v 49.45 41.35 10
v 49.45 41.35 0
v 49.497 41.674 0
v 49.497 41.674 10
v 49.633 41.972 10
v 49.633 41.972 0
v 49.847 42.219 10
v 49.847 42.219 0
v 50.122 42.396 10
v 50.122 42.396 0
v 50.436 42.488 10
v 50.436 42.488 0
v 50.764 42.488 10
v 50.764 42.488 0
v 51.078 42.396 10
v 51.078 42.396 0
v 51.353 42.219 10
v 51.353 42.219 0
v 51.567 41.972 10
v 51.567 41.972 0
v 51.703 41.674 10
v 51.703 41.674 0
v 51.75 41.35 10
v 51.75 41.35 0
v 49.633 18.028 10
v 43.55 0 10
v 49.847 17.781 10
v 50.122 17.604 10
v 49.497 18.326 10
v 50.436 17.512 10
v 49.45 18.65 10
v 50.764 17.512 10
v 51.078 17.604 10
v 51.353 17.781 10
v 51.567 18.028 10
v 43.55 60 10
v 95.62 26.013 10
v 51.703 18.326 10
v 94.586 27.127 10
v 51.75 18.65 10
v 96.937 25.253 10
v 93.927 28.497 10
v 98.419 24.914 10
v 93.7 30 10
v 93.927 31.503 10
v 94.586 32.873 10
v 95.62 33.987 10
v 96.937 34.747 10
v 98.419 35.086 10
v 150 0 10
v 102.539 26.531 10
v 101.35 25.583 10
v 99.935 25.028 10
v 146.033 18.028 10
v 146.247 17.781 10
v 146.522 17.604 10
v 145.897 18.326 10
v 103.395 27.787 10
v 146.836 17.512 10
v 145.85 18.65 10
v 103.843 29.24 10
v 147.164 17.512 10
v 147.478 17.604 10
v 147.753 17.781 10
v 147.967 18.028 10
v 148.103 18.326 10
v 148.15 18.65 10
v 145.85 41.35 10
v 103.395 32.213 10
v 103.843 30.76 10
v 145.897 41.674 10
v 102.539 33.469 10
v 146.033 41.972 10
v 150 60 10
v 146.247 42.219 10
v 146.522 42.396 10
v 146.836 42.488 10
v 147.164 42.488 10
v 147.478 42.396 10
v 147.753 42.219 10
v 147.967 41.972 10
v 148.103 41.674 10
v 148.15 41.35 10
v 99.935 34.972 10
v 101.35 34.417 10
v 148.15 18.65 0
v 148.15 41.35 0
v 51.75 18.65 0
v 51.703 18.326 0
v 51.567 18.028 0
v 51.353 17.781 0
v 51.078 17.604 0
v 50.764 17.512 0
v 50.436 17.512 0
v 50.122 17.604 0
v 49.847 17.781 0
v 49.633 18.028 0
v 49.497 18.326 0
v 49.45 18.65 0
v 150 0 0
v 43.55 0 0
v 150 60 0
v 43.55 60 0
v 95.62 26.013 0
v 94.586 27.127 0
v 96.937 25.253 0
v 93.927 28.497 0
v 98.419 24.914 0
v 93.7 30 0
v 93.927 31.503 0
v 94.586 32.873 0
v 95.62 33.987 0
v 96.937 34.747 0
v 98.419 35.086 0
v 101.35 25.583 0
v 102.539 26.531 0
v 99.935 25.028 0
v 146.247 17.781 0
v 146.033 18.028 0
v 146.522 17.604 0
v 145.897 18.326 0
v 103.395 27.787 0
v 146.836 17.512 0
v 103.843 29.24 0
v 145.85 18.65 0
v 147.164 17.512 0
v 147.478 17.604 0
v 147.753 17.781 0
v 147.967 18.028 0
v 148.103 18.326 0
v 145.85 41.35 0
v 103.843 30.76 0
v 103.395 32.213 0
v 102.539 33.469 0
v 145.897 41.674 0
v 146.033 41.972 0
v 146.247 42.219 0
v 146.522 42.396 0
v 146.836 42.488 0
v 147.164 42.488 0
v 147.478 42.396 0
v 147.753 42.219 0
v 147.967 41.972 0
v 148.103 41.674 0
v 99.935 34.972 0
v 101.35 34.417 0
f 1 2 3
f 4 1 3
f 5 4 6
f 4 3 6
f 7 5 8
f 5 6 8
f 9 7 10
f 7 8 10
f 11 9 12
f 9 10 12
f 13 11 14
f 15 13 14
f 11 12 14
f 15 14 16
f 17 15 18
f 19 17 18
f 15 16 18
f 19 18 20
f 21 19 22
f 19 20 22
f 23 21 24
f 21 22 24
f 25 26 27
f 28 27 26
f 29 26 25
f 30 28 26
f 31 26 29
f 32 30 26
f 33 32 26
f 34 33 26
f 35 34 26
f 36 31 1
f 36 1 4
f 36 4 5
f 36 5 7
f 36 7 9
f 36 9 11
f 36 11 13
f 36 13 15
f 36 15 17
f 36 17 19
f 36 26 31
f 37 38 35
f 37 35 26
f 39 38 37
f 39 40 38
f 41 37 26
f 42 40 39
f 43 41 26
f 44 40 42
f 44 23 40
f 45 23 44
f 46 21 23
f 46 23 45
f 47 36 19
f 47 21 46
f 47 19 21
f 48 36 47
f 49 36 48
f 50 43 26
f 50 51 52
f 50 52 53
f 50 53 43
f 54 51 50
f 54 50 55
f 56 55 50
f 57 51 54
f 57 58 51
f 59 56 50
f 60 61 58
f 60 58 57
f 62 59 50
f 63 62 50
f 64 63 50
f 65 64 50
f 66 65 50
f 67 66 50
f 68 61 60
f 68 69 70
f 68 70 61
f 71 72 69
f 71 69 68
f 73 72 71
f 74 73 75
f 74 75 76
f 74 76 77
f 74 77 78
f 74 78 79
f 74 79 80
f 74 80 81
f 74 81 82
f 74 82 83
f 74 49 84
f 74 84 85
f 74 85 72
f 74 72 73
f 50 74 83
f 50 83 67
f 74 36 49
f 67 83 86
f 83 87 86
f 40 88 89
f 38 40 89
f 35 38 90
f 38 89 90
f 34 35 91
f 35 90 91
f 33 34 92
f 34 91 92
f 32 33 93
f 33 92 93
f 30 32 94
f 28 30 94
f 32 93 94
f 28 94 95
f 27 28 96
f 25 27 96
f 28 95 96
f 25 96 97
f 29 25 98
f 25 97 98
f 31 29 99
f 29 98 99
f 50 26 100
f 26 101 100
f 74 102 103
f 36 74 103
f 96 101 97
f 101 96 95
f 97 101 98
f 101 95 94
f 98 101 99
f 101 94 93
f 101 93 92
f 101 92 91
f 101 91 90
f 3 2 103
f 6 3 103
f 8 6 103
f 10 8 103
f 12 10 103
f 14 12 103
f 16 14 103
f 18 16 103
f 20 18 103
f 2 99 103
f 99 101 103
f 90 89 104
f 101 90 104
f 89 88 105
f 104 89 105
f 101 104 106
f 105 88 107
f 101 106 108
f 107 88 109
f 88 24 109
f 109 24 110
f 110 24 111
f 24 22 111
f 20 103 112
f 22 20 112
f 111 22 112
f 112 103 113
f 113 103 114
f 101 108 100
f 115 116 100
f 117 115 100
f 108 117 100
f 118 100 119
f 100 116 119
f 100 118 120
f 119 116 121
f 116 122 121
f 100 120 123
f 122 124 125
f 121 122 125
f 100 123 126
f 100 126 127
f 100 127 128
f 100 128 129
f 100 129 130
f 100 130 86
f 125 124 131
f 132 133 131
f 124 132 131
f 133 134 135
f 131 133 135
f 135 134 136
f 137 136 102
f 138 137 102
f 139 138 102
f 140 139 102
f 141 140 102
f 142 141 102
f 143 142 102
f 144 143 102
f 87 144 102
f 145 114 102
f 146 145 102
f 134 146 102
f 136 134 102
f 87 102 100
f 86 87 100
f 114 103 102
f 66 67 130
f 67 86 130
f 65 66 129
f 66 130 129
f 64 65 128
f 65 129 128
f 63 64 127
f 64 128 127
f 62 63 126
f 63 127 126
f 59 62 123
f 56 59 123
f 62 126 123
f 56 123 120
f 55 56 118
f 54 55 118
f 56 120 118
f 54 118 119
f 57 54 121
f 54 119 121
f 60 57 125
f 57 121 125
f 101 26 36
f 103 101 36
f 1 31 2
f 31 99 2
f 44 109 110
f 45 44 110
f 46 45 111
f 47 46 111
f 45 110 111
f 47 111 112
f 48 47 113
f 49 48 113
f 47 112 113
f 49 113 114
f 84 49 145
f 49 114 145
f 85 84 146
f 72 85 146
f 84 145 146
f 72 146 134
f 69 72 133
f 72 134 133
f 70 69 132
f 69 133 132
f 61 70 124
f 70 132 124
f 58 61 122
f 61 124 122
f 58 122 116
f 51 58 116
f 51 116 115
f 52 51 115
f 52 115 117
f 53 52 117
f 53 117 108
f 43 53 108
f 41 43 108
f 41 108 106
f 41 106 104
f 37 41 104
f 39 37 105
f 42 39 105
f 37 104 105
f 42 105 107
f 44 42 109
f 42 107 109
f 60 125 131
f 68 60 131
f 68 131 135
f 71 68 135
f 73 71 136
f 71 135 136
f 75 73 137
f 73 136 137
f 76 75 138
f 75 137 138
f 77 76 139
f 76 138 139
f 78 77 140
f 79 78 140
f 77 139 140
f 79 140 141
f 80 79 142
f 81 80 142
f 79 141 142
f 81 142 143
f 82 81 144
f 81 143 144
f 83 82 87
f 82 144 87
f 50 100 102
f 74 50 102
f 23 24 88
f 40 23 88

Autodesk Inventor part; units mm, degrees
ref_plane "YZ Plane" through (0, 0, 0) normal (1, 0, 0) x (0, 1, 0)
ref_plane "XZ Plane" through (0, 0, 0) normal (0, 1, 0) x (-1, 0, 0)
ref_plane "XY Plane" through (0, 0, 0) normal (0, 0, 1) x (1, 0, 0)
sketch "Sketch1" plane through (0, 0, 0) normal (0, 0, 1) x (1, 0, 0)
  line L0 (0, 0) -> (150, 0)
  line L1 (150, 0) -> (150, 60)
  line L2 (150, 60) -> (0, 60)
  line L3 (0, 60) -> (0, 0)
  dimension "d1" = 60
extrude "Extrusion1" add sketch "Sketch1" along normal blind 10
sketch "Sketch2" plane through (0, 0, 0) normal (0, 0, -1) x (-1, 0, 0)
  line L0 (-150, 60) -> (0, 60) projected
  line L1 (0, 0) -> (-150, 0) projected
  circle A0 centre (-98.8, 30) radius 5.1
  dimension "d5" = 10.2
  dimension "d6" = 30
  dimension "d20" = 98.8
extrude "Extrusion2" cut sketch "Sketch2" against normal blind 10
sketch "Sketch3" plane through (0, 0, 0) normal (0, 0, -1) x (-1, 0, 0)
  line L0 (-147, 18.65) -> (-147, 41.35) construction
  line L1 (-145.85, 18.65) -> (-145.85, 41.35)
  line L2 (-148.15, 41.35) -> (-148.15, 18.65)
  arc A0 (-148.15, 18.65) -> (-145.85, 18.65) centre (-147, 18.65) ccw
  arc A1 (-145.85, 41.35) -> (-148.15, 41.35) centre (-147, 41.35) ccw
  line L3 (0, 0) -> (-150, 0) projected
  circle A2 centre (-98.8, 30) radius 5.1 projected
  circle A3 centre (-98.8, 30) radius 5.1 projected
  line L4 (-150, 0) -> (-150, 60) projected
  line L5 (-150, 60) -> (0, 60) projected
  line L6 (0, 60) -> (0, 0) projected
  line L7 (0, 0) -> (-150, 0) projected
  line L8 (-50.6, 18.65) -> (-50.6, 41.35) construction
  line L9 (-49.45, 18.65) -> (-49.45, 41.35)
  line L10 (-51.75, 41.35) -> (-51.75, 18.65)
  arc A4 (-51.75, 18.65) -> (-49.45, 18.65) centre (-50.6, 18.65) ccw
  arc A5 (-49.45, 41.35) -> (-51.75, 41.35) centre (-50.6, 41.35) ccw
  point P0 (-147, 30)
  point P1 (-147, 42.5)
  point P2 (-147, 17.5)
  point P3 (-50.6, 30)
  point P4 (-50.6, 42.5)
  point P5 (-50.6, 17.5)
  dimension "d10" = 2.3
  dimension "d12" = 25
  dimension "d17" = 3
  dimension "d27" = 2.3
  dimension "d28" = 25
  dimension "d29" = 48.2
extrude "Extrusion3" cut sketch "Sketch3" against normal blind 10 contours A0 L2 A1 L1 | A4 L10 A5 L9
sketch "Sketch4" plane through (0, 0, 10) normal (0, 0, 1) x (1, 0, 0)
  line L0 (0, 60) -> (0, 0) projected
  line L1 (150, 60) -> (0, 60) projected
  line L2 (0, 0) -> (43.5504, 0)
  line L3 (43.5504, 0) -> (43.5504, 60)
  line L4 (43.5504, 60) -> (0, 60)
  line L5 (0, 60) -> (0, 0)
extrude "Extrusion4" cut sketch "Sketch4" against normal through all
properties part number "base"
